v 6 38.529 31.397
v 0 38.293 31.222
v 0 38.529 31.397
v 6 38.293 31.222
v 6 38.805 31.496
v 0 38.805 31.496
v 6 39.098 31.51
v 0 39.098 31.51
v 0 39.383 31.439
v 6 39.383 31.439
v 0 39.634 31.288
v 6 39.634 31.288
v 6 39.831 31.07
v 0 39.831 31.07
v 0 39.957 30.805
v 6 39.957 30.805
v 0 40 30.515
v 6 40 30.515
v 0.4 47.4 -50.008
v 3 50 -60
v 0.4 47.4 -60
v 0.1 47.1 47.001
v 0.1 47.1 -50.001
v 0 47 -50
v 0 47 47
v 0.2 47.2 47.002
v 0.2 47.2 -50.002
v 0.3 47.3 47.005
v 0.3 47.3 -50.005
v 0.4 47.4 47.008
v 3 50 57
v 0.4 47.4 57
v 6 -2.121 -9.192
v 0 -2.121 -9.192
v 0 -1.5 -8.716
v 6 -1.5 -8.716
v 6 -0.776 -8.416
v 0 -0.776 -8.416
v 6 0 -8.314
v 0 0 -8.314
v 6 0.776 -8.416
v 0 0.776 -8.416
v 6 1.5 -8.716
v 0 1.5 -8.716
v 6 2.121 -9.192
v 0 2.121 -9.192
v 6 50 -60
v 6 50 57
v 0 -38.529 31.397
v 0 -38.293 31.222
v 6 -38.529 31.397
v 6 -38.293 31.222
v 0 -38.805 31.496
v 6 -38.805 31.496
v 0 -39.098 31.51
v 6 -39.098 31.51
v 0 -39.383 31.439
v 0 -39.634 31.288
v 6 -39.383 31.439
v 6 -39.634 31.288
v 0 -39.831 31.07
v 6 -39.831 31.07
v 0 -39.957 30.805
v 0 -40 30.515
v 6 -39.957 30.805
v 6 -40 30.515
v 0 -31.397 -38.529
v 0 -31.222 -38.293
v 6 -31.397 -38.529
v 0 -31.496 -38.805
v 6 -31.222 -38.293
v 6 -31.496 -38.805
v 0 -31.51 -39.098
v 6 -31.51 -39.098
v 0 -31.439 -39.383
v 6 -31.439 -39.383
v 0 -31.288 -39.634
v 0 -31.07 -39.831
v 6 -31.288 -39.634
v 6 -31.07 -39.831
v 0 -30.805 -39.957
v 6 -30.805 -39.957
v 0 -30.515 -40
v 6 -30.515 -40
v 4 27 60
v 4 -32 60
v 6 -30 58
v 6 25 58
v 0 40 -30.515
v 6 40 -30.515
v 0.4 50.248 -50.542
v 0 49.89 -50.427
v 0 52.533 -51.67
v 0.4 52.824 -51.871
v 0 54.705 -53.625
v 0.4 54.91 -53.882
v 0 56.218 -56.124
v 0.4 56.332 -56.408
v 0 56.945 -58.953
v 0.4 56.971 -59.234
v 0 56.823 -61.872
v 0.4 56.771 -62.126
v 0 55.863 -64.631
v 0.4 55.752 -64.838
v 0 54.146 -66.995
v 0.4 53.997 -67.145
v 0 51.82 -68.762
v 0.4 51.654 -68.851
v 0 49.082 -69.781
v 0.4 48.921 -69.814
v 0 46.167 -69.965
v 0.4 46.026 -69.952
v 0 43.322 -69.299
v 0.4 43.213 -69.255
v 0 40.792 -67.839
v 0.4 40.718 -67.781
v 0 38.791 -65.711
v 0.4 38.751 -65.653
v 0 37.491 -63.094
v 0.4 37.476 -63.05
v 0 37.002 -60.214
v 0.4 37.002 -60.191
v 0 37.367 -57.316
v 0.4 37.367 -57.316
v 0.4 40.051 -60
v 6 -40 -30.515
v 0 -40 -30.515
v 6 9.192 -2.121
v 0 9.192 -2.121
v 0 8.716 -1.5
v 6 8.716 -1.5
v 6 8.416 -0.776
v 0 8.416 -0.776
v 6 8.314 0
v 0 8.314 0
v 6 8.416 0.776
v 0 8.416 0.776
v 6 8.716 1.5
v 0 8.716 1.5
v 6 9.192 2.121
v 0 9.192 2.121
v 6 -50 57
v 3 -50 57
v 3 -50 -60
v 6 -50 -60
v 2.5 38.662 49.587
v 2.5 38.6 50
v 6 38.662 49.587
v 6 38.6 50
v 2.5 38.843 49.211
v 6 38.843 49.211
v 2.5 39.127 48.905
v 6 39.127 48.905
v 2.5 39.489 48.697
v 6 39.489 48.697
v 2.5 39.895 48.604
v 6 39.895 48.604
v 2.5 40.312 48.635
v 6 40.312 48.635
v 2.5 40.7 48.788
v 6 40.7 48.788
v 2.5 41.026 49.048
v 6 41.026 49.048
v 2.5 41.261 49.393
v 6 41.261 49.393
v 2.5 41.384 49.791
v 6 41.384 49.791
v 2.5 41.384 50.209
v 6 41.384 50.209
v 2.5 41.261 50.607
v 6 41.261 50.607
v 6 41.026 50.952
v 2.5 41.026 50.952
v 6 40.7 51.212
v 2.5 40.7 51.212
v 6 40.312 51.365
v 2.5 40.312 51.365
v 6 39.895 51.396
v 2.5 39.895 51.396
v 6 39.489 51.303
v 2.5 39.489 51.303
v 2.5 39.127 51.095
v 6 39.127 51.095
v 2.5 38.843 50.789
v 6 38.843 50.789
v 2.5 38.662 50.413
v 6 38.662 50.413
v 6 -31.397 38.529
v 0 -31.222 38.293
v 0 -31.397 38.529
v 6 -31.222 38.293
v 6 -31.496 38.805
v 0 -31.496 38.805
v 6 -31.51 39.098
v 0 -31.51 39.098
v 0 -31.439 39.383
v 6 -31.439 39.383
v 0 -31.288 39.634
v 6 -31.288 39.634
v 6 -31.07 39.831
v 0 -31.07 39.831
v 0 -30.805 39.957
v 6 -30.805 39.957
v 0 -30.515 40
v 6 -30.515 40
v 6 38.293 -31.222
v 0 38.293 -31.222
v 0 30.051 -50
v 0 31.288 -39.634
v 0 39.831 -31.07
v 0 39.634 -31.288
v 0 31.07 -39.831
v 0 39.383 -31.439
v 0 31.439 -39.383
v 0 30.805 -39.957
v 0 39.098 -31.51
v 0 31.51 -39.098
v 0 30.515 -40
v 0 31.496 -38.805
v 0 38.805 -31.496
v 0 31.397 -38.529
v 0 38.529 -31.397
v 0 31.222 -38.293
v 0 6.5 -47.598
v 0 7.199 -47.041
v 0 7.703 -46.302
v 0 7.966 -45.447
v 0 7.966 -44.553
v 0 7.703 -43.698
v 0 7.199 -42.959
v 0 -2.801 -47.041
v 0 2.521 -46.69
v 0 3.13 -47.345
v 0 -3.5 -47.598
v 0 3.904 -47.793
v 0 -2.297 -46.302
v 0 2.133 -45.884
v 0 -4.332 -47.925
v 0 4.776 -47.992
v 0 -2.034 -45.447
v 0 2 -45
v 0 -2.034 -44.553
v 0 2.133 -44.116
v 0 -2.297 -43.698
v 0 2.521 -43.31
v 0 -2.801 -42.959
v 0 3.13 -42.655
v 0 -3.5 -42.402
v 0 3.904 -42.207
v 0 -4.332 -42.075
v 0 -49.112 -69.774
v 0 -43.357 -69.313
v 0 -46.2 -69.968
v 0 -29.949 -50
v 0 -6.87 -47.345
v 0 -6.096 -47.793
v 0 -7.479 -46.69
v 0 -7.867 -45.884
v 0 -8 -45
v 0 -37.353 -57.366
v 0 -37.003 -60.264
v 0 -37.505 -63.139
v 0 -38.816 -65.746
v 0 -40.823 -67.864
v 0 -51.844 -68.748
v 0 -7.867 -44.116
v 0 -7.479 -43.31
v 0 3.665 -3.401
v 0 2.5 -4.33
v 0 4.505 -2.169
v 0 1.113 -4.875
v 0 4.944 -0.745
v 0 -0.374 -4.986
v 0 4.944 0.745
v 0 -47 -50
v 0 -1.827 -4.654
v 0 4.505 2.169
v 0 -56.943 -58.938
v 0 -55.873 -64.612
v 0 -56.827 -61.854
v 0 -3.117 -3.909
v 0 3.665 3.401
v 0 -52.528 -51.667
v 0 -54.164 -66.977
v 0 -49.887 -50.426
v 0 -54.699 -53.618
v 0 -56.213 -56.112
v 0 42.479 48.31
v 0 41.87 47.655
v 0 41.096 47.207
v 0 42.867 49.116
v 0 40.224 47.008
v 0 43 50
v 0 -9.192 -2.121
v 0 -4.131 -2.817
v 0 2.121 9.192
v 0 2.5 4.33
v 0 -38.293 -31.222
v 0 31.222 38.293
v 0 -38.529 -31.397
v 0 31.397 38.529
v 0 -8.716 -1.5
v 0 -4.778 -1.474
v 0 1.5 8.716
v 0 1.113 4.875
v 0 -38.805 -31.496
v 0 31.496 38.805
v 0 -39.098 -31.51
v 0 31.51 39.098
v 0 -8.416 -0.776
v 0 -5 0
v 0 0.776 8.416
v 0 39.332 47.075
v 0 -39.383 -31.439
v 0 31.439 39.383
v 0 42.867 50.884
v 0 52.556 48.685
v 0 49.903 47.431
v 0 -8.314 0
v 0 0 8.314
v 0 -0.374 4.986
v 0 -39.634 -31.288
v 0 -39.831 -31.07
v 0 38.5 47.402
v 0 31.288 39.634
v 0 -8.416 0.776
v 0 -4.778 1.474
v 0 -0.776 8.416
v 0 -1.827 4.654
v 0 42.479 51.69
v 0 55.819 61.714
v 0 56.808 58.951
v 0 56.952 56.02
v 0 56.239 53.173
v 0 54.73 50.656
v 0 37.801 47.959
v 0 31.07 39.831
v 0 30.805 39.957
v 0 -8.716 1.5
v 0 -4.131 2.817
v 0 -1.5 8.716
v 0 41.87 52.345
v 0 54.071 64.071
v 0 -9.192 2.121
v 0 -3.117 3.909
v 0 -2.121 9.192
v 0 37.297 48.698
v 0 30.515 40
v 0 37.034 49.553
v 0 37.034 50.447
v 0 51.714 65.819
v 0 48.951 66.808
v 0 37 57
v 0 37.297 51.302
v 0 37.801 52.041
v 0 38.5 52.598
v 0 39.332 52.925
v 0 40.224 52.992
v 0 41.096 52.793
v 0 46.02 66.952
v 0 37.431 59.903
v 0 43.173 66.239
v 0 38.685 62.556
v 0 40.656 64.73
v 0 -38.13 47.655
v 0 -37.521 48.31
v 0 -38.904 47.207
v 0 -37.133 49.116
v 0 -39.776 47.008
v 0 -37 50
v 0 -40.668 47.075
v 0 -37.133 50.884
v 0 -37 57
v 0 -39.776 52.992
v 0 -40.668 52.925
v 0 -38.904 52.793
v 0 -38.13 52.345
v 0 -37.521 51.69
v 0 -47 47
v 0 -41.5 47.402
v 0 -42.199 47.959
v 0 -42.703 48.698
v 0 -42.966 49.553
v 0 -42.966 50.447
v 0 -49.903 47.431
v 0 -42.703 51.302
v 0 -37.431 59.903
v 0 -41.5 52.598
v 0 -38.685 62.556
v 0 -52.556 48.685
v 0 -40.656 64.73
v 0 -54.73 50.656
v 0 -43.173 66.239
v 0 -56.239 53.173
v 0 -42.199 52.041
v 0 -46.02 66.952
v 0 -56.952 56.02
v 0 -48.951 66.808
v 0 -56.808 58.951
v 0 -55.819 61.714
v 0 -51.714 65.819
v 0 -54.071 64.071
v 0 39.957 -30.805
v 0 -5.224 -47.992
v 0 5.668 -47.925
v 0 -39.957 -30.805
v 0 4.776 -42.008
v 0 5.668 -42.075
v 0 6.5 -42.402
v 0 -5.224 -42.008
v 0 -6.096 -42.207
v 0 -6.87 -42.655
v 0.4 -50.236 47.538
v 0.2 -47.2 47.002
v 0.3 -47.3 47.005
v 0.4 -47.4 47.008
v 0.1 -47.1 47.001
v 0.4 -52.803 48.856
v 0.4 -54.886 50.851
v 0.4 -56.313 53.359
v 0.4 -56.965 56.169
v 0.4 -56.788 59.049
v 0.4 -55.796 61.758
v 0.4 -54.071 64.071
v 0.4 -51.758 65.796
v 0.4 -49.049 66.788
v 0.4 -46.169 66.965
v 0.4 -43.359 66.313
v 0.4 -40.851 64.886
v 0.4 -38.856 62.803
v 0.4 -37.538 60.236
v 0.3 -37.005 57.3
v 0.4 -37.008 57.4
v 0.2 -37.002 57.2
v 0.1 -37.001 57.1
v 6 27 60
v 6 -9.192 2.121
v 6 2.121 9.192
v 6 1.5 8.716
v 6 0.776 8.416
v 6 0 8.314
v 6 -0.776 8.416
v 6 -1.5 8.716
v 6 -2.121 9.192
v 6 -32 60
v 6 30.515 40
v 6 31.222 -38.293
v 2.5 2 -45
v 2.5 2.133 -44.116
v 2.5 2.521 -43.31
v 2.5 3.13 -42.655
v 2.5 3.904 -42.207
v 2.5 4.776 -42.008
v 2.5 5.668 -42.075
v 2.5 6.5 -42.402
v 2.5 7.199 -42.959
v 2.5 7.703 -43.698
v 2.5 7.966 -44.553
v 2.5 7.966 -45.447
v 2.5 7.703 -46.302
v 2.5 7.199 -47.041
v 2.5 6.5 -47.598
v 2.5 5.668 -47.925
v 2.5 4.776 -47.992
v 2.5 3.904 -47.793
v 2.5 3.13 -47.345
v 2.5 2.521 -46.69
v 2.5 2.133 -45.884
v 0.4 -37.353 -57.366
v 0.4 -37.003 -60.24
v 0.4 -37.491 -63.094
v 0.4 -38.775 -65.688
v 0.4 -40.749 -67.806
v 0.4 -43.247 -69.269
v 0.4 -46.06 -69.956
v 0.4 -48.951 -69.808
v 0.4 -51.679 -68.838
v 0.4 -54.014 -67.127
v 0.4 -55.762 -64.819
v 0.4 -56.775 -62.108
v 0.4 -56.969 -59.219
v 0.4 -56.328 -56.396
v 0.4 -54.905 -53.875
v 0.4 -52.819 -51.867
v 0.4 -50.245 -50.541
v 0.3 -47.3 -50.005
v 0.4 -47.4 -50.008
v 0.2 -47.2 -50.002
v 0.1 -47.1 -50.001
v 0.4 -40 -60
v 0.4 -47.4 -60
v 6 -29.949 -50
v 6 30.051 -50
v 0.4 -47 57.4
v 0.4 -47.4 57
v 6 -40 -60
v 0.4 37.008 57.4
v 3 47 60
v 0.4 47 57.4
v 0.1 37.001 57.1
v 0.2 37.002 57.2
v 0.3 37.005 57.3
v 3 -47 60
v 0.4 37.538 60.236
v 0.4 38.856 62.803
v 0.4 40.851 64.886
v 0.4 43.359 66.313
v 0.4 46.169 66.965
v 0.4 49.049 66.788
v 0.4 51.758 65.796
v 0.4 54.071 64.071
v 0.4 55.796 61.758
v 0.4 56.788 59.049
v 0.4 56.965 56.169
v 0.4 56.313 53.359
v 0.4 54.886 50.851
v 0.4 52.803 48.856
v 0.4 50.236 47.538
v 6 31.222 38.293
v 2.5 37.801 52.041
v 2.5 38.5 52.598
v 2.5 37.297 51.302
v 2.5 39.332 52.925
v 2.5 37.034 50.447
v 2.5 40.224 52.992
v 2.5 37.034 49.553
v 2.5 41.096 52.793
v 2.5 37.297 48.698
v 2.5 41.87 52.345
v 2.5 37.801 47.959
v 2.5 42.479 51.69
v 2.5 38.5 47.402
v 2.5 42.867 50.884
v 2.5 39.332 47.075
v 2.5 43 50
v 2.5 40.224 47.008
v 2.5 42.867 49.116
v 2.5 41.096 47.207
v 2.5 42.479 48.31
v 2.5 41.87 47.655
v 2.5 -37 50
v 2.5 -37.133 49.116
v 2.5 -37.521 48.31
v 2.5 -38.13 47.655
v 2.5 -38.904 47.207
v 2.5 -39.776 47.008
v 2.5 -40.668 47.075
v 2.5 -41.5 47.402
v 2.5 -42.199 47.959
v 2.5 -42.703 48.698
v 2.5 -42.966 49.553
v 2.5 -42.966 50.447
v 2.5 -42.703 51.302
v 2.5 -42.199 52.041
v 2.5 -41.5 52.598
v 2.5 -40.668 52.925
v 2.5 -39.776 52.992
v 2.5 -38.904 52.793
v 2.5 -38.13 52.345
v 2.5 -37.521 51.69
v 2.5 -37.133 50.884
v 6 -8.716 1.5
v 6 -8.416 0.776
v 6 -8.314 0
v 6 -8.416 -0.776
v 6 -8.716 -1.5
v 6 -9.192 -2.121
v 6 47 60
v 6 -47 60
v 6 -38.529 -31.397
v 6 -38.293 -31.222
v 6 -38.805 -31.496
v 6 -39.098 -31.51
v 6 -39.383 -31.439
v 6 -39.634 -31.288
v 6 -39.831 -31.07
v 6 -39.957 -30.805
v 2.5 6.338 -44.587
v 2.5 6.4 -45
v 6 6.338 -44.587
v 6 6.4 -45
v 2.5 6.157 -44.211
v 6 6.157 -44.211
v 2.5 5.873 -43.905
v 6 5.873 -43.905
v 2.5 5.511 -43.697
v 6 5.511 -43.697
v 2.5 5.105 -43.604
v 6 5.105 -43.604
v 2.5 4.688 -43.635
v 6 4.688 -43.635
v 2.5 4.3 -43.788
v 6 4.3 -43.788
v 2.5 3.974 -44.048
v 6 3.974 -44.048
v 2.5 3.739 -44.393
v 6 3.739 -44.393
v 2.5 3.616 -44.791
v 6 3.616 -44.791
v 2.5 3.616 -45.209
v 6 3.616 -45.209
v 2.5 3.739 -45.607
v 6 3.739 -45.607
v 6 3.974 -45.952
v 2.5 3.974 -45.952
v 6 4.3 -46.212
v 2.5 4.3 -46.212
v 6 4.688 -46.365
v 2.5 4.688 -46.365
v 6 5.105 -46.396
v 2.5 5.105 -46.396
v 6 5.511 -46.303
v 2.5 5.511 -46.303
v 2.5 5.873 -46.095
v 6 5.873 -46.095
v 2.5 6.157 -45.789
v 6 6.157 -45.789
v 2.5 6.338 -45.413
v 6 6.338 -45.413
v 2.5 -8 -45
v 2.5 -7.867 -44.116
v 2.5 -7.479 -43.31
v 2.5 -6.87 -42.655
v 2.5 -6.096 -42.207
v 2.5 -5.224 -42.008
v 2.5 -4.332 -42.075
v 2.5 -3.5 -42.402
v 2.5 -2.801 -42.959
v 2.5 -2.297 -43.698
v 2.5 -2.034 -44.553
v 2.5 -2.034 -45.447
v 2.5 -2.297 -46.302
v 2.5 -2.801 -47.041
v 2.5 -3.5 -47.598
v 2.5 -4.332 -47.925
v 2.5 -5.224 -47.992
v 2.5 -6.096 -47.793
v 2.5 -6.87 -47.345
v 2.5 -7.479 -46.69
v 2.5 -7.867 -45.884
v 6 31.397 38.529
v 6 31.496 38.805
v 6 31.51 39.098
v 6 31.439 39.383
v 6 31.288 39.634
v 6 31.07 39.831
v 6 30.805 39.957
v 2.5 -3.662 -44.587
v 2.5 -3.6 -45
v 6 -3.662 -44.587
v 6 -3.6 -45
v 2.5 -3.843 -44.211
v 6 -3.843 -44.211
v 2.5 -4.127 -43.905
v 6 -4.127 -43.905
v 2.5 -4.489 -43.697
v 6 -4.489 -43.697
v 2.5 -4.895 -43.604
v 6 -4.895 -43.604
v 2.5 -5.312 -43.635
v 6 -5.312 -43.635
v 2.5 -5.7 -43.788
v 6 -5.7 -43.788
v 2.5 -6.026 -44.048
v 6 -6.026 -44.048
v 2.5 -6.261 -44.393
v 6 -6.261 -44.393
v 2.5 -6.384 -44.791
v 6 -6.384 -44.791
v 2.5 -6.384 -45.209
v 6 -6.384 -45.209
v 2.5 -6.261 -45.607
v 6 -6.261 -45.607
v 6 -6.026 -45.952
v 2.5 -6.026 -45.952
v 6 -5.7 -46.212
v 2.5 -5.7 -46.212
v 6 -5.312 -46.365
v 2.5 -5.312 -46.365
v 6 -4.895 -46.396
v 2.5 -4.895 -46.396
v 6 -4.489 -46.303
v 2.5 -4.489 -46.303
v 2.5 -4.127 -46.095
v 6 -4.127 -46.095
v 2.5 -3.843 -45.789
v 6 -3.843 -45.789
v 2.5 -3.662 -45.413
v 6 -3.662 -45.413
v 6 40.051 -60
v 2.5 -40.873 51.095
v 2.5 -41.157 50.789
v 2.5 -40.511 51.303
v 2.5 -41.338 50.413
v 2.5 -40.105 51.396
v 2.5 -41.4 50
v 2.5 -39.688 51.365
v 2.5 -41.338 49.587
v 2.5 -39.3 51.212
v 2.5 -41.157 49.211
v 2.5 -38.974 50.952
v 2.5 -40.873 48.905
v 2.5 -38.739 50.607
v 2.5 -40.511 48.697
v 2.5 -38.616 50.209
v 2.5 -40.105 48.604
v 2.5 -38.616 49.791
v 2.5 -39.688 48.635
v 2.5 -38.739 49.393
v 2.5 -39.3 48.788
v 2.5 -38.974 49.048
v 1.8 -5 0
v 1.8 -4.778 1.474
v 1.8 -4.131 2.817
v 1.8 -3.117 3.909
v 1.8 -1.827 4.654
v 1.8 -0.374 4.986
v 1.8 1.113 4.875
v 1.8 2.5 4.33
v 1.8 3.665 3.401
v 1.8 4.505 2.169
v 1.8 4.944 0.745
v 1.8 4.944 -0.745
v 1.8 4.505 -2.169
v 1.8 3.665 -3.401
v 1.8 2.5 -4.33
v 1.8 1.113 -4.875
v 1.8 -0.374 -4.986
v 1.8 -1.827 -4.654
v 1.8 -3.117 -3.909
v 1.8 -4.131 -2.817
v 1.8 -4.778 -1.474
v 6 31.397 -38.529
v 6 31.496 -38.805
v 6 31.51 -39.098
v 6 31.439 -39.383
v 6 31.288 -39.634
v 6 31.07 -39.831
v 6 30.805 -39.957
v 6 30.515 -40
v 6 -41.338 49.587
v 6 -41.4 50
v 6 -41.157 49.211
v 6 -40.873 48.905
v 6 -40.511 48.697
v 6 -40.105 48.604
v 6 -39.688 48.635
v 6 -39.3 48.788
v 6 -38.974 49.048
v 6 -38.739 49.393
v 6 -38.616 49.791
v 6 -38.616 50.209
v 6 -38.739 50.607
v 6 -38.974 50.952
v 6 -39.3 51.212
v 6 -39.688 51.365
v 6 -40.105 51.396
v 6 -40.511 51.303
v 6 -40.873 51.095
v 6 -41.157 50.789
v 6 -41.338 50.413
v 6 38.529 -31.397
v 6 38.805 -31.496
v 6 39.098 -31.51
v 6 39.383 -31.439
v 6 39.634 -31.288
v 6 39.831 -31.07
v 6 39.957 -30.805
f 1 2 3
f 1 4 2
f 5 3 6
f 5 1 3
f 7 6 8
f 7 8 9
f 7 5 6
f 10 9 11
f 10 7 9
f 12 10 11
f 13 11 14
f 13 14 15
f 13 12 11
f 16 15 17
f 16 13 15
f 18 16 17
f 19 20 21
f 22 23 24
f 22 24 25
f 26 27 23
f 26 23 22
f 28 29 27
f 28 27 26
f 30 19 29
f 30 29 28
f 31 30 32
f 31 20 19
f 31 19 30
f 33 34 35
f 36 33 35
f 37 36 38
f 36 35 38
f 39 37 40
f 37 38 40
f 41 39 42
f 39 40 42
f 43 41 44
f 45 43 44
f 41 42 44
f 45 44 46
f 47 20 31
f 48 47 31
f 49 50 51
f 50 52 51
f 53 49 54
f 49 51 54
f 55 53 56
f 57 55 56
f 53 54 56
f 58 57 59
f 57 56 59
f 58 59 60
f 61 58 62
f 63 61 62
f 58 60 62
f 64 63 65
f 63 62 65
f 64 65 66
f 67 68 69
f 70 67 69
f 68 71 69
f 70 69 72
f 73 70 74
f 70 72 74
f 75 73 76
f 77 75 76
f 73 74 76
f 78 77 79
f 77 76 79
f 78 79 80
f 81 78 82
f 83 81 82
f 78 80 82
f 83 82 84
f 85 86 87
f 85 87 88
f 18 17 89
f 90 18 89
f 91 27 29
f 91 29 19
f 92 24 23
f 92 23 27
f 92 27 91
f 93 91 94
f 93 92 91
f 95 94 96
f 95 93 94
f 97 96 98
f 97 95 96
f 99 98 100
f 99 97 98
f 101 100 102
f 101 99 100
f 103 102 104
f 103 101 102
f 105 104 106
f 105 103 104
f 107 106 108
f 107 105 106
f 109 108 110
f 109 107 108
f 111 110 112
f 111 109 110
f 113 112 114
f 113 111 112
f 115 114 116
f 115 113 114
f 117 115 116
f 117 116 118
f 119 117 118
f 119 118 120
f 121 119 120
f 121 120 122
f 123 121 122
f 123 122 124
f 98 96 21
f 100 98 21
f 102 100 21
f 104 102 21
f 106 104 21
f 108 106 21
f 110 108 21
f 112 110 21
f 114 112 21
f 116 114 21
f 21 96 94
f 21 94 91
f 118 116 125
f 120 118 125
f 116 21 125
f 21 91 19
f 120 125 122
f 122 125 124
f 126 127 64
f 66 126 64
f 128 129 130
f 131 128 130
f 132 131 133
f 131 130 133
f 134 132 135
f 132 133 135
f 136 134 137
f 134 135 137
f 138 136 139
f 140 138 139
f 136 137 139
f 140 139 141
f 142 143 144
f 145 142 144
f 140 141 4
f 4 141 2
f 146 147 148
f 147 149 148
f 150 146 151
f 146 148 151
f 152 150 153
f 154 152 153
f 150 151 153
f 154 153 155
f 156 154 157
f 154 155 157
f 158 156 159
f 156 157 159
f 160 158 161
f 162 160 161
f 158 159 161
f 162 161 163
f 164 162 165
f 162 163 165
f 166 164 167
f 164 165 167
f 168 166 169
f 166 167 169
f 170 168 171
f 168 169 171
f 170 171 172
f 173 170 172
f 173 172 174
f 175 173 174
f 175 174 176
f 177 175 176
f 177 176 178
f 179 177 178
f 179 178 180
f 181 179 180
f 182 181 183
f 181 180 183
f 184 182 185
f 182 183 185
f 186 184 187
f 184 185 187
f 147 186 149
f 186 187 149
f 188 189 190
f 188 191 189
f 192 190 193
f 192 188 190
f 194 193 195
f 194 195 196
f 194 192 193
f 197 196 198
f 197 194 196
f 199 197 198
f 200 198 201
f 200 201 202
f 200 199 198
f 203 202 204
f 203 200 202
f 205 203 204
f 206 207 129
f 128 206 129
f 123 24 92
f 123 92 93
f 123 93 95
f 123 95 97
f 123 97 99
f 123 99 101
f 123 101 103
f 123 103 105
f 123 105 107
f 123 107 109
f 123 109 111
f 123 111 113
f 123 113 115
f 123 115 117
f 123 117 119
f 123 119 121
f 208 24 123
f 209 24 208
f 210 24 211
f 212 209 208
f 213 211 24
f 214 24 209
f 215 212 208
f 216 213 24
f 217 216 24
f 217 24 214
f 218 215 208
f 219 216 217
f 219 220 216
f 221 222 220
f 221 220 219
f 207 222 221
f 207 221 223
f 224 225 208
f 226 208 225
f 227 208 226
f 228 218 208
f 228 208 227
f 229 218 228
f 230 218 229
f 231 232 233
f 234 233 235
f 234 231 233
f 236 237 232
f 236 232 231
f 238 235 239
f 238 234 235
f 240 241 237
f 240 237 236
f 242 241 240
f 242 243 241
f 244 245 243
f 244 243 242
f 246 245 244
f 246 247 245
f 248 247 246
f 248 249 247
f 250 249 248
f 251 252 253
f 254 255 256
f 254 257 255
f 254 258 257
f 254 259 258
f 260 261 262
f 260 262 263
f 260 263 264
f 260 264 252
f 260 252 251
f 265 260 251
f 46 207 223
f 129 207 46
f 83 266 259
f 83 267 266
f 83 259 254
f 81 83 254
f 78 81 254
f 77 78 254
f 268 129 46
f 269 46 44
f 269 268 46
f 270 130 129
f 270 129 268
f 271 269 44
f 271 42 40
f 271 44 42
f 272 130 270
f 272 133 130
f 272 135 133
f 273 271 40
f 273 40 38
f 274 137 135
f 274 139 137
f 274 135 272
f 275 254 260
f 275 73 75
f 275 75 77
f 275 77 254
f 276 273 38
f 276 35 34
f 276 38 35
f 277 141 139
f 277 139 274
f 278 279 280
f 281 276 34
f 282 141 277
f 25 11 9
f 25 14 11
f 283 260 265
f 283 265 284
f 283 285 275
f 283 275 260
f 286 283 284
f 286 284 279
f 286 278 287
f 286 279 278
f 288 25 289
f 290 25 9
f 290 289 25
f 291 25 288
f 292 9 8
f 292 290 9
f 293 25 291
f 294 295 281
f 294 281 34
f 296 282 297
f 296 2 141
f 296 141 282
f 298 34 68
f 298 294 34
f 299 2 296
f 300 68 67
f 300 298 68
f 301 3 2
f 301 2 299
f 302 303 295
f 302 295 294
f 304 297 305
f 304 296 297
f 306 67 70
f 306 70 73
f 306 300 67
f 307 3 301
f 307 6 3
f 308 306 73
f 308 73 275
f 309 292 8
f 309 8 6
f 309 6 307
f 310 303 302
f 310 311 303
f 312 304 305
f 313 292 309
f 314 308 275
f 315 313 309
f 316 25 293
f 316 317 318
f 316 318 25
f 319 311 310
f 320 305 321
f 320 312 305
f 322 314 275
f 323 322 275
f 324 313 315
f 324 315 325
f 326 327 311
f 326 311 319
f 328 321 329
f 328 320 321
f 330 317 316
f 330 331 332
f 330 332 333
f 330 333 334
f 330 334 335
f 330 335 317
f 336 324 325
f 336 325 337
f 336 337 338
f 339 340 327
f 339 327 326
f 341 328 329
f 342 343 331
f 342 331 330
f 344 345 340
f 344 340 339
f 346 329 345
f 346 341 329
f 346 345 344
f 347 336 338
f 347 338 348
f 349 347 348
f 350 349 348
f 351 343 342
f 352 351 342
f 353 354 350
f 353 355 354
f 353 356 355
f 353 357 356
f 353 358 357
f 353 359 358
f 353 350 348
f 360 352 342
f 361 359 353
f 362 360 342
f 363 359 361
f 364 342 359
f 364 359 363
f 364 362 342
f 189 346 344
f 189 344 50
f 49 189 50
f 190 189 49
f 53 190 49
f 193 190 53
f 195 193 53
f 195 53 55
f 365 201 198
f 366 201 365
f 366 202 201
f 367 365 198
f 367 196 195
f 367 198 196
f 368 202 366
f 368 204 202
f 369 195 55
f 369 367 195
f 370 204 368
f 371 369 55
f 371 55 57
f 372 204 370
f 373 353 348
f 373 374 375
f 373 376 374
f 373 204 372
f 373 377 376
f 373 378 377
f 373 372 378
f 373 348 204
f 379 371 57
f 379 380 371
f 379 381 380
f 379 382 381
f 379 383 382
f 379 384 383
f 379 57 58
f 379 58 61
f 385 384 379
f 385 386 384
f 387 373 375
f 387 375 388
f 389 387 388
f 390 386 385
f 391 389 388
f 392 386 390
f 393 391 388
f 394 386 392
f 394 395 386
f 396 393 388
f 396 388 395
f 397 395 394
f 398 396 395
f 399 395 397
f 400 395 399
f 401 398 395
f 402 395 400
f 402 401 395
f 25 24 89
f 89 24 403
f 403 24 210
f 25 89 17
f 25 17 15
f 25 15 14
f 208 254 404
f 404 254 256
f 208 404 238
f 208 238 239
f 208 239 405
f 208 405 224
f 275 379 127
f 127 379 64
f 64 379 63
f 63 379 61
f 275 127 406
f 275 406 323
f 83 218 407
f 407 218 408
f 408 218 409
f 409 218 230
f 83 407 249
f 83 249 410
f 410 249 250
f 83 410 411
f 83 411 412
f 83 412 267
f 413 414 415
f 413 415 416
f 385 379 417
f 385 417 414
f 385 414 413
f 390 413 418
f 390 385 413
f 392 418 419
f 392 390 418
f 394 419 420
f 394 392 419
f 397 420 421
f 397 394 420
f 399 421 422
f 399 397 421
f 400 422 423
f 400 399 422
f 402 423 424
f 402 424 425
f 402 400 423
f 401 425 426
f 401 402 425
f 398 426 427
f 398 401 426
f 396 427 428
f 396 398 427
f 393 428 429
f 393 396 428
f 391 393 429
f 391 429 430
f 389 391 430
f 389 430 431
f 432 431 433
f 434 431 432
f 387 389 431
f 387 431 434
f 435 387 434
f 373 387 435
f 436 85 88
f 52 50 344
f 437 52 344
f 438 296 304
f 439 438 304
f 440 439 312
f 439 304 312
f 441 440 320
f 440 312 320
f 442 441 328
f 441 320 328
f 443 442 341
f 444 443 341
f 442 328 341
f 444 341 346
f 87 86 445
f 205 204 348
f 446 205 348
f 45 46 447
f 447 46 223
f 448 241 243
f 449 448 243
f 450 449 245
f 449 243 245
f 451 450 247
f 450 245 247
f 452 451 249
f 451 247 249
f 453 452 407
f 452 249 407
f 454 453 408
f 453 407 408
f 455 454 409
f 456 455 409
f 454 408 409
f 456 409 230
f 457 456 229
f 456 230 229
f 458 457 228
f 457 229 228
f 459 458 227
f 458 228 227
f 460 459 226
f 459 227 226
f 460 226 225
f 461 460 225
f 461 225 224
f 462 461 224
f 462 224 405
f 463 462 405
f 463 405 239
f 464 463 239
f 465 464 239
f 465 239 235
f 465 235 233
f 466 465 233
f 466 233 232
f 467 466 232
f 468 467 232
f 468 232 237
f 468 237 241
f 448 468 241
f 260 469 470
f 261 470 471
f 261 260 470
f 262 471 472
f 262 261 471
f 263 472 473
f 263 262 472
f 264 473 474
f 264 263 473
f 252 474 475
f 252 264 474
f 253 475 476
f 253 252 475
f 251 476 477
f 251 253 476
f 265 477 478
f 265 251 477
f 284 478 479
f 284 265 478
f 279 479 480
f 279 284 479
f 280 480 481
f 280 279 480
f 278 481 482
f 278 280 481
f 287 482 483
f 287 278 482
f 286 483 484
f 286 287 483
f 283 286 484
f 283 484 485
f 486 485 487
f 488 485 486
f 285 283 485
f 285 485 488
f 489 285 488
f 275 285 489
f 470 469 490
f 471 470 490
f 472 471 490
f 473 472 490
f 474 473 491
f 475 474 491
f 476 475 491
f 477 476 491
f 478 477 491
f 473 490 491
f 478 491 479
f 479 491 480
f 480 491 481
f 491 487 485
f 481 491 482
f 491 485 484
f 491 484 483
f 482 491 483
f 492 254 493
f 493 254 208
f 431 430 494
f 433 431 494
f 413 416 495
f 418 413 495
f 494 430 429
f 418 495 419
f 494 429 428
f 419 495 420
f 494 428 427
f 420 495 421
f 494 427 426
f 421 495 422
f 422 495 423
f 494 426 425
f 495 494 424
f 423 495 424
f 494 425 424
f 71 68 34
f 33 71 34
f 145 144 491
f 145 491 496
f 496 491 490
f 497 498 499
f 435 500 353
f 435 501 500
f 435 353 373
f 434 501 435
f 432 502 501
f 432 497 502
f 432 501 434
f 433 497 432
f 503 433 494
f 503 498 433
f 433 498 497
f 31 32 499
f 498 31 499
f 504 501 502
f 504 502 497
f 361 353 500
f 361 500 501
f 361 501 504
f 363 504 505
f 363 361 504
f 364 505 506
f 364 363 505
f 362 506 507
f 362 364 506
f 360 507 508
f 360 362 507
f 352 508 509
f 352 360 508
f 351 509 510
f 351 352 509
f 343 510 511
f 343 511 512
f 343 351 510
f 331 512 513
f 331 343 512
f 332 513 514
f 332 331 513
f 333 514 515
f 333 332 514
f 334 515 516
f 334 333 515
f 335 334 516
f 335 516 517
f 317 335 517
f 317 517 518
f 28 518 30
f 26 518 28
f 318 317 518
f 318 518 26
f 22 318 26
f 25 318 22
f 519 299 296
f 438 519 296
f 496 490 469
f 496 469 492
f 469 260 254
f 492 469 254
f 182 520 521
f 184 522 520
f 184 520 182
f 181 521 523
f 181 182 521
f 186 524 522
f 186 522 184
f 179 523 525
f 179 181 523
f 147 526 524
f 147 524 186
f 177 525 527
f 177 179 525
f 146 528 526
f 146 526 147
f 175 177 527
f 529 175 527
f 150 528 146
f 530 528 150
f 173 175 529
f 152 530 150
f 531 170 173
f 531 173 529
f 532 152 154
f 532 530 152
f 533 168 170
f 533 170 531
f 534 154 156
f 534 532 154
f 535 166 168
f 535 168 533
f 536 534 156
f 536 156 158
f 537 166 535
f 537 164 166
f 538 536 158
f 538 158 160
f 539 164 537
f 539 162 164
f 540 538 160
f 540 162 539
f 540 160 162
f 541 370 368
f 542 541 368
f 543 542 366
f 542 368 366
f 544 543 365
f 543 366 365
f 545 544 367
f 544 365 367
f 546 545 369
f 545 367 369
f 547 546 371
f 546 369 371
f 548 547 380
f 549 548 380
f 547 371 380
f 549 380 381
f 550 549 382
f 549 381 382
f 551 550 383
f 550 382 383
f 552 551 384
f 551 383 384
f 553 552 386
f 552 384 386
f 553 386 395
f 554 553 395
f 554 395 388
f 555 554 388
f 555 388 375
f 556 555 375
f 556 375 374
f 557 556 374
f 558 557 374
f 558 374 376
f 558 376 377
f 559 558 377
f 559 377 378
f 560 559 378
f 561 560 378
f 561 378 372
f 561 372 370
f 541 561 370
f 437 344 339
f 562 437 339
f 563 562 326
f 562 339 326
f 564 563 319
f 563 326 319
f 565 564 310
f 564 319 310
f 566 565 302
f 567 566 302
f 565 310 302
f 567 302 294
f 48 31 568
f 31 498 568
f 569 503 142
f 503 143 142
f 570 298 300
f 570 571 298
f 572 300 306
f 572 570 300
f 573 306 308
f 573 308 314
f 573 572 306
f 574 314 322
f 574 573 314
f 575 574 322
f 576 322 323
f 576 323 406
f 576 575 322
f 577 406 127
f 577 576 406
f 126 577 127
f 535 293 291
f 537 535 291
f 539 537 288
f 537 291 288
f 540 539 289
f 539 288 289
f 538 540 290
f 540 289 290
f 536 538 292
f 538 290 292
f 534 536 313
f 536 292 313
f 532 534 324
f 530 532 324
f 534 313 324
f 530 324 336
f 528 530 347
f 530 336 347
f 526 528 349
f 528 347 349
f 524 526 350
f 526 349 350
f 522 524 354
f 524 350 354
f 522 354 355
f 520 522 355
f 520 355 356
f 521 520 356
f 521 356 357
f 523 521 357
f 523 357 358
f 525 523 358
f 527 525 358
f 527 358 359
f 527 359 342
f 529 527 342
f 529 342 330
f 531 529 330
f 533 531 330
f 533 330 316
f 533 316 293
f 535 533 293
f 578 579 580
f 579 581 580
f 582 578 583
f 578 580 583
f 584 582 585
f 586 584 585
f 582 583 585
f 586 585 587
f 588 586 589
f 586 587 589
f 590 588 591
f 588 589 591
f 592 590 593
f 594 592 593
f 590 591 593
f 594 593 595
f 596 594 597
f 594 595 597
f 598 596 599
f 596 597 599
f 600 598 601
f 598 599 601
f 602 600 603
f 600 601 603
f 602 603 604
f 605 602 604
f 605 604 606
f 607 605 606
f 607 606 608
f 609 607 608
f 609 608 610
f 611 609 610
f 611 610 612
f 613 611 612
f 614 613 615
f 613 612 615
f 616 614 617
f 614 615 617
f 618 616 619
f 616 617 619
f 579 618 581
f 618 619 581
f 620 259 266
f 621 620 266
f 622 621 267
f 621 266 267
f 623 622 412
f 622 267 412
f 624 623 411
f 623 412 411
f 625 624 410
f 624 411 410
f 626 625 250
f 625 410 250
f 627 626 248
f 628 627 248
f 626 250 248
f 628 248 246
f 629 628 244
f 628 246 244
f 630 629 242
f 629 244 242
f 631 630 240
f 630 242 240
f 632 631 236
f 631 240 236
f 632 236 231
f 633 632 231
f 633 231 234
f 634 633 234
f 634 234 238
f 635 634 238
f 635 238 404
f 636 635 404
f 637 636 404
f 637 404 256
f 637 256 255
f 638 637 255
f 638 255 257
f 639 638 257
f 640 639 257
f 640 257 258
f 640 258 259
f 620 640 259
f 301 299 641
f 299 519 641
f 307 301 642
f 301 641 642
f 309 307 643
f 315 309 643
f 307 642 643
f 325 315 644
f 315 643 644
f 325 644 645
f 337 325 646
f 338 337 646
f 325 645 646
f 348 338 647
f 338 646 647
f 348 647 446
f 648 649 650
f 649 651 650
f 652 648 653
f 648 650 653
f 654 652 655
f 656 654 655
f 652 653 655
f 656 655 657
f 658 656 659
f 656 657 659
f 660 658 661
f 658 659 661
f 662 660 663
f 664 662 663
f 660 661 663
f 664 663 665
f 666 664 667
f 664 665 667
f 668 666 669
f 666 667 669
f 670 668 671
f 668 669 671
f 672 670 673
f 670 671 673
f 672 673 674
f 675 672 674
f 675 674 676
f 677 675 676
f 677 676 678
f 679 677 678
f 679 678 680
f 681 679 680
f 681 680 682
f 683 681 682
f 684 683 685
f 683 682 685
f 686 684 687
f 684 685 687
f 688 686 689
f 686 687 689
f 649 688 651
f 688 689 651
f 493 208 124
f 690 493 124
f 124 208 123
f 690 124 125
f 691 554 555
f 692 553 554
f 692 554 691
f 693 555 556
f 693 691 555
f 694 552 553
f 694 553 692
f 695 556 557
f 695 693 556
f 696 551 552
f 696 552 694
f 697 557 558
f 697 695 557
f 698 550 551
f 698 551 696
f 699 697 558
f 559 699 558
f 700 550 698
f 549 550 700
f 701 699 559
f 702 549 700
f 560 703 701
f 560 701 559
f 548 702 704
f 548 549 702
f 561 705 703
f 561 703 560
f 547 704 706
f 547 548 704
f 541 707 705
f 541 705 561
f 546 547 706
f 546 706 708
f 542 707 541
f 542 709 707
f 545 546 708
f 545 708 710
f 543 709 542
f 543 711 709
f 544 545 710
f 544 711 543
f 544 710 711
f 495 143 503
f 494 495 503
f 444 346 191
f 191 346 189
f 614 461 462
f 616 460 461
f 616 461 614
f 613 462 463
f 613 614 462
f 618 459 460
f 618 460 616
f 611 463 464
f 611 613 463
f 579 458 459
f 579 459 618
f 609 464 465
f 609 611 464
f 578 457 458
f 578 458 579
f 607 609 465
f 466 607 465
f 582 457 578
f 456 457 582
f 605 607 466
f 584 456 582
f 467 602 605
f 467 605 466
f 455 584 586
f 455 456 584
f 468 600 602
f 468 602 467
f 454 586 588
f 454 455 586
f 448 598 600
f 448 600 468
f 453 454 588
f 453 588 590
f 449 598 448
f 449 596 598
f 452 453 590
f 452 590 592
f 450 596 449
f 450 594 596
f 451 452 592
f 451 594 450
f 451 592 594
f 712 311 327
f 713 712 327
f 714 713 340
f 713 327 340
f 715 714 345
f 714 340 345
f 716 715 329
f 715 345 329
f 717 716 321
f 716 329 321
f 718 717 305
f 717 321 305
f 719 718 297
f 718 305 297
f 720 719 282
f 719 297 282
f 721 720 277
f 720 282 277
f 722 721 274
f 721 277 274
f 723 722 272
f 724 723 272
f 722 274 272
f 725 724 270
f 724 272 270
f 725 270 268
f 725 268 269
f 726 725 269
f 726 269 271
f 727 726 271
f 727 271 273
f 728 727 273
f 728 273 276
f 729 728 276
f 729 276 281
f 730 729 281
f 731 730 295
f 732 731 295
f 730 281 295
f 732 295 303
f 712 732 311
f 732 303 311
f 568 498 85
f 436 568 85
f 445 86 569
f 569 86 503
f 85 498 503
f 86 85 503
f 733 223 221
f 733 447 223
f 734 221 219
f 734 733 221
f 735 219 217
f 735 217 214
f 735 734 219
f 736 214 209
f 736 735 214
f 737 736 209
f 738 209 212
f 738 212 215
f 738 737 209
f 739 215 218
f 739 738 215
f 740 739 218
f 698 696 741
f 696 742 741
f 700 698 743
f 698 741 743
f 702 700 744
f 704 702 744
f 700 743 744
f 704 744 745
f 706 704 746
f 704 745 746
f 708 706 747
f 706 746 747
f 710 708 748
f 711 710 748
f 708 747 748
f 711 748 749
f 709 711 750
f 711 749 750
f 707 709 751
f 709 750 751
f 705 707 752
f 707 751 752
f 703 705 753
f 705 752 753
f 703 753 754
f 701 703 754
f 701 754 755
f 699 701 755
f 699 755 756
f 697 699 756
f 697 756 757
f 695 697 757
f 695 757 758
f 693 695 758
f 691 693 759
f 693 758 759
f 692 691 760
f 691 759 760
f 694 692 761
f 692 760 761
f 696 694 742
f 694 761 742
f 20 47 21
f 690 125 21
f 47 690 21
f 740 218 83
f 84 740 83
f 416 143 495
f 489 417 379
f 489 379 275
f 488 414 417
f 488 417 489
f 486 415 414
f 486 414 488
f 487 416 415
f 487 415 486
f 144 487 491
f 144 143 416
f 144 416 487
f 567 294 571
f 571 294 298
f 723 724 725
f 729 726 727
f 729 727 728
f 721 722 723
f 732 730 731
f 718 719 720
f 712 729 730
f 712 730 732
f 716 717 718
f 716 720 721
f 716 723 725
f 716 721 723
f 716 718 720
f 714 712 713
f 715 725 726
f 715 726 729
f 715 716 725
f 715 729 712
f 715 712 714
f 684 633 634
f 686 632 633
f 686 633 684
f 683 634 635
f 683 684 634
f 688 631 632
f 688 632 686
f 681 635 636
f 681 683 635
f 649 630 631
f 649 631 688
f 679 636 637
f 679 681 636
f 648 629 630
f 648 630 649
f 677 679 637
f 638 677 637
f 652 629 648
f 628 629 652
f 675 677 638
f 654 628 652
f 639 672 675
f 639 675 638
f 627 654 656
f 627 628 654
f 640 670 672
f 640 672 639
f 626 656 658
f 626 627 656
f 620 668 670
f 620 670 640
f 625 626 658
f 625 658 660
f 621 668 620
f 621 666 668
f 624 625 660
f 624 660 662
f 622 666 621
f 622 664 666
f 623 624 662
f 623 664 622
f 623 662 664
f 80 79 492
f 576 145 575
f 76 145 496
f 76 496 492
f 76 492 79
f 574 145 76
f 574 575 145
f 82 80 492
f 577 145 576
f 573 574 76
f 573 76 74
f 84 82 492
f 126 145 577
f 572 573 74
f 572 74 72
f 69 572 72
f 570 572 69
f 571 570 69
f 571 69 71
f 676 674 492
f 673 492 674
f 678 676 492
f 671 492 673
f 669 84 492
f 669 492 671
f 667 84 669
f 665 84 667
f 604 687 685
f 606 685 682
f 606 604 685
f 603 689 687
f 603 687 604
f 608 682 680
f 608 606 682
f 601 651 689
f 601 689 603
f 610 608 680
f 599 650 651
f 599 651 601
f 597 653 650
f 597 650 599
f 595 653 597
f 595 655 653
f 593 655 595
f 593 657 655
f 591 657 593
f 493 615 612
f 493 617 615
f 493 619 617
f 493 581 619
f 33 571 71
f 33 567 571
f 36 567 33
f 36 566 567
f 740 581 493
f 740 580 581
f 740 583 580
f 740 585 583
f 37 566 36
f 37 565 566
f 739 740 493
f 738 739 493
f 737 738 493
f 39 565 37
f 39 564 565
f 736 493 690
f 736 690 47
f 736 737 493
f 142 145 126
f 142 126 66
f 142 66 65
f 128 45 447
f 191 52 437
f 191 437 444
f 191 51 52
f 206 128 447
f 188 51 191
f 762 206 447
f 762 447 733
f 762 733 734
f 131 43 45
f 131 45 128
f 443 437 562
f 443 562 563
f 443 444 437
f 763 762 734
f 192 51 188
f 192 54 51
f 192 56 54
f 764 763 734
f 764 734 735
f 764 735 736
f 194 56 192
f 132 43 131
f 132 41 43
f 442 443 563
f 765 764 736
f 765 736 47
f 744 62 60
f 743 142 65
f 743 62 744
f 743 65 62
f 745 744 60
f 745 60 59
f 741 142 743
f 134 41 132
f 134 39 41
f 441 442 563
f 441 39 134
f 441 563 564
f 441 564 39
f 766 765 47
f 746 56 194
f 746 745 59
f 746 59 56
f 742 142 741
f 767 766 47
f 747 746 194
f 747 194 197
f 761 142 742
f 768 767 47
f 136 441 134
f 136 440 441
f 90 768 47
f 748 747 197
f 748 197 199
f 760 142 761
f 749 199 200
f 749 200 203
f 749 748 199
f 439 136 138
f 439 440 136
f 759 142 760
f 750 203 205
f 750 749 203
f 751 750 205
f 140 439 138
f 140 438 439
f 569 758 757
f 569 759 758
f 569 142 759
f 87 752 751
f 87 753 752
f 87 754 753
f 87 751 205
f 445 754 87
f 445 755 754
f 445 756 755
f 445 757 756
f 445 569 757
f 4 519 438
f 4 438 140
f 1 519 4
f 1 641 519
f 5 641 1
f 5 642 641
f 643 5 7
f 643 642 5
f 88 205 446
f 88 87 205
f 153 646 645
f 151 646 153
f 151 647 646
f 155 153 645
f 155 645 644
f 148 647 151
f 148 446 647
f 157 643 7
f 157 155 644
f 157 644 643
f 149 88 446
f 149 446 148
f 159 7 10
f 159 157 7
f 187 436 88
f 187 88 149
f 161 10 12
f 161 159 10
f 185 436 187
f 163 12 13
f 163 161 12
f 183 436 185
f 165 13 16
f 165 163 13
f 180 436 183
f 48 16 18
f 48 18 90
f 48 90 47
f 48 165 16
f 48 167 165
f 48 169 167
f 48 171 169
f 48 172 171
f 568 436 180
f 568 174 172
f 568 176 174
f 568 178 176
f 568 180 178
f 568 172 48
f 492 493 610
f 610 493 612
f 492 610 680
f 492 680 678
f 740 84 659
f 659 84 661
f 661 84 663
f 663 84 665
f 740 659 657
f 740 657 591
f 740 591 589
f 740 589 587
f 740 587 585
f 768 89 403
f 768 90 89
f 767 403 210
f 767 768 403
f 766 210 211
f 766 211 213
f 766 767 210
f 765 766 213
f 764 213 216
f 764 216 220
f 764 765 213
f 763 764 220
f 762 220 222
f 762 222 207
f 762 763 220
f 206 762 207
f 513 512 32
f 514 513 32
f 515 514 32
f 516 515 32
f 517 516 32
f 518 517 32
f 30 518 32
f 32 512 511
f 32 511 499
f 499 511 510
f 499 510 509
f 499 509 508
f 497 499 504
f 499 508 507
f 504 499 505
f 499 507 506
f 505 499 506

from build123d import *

# Parameters (mm, degrees)
F1_DEPTH       = 6
F2_R           = 1
F3_D           = 2.8
F3_CBORE_D     = 6
F3_CBORE_DEPTH = 2.5
F4_R           = 5
F5_DEPTH       = 1.8
F7_D           = 2.8
F7_CBORE_D     = 6
F7_CBORE_DEPTH = 2.5
F8_SIZE        = 3
F10_DEPTH      = 0.4
F11_W          = 2
F11_H          = 59
F12_DEPTH      = 2
F13_SIZE       = 1.99999


# Not quite as in the source:
# - a fillet or chamfer is up to 0.001 mm smaller than in the source, because OpenCascade refuses the exact size


with BuildPart() as f1:
    # F0 (on Right) → F1 (new body)
    with BuildSketch(Plane.YZ):
        Polygon((40.0512183458, -60), (50, -60), (50, 60), (-50, 60), (-50, -60), (-40, -60), (-29.9487816542, -50), (30.0512183458, -50), align=None)
        with BuildLine():
            Line((2.1213203436, -9.1923881554), (32.9289321881, -40))
            Line((32.9289321881, -40), (-32.9289321881, -40))
            Line((-32.9289321881, -40), (-2.1213203436, -9.1923881554))
            ThreePointArc((-2.1213203436, -9.1923881554), (0, -8.313708499), (2.1213203436, -9.1923881554))
        make_face(mode=Mode.SUBTRACT)
        with BuildLine():
            Line((-9.1923881554, -2.1213203436), (-40, -32.9289321881))
            Line((-40, -32.9289321881), (-40, 32.9289321881))
            Line((-40, 32.9289321881), (-9.1923881554, 2.1213203436))
            ThreePointArc((-9.1923881554, 2.1213203436), (-8.313708499, 0), (-9.1923881554, -2.1213203436))
        make_face(mode=Mode.SUBTRACT)
        with BuildLine():
            Line((40, 32.9289321881), (40, -32.9289321881))
            Line((40, -32.9289321881), (9.1923881554, -2.1213203436))
            ThreePointArc((9.1923881554, -2.1213203436), (8.313708499, 0), (9.1923881554, 2.1213203436))
            Line((9.1923881554, 2.1213203436), (40, 32.9289321881))
        make_face(mode=Mode.SUBTRACT)
        with BuildLine():
            Line((-32.9289321881, 40), (32.9289321881, 40))
            Line((32.9289321881, 40), (2.1213203436, 9.1923881554))
            ThreePointArc((2.1213203436, 9.1923881554), (0, 8.313708499), (-2.1213203436, 9.1923881554))
            Line((-2.1213203436, 9.1923881554), (-32.9289321881, 40))
        make_face(mode=Mode.SUBTRACT)
    extrude(amount=F1_DEPTH)

    # F2
    f2_edges = [f1.edges().sort_by_distance(p)[0] for p in [
        (3, -32.928932, 40),
        (3, 32.928932, 40),
        (3, -40, 32.928932),
        (3, -40, -32.928932),
        (3, -32.928932, -40),
        (3, 40, 32.928932),
        (3, 40, -32.928932),
        (3, 32.928932, -40),
    ]]
    fillet(f2_edges, radius=F2_R)

    # F3 (through all)
    with Locations(Plane(origin=(0, 0, 0), x_dir=(0, 1, 0), z_dir=(-1, 0, 0))):
        with Locations((-40, -50), (40, -50)):
            CounterBoreHole(F3_D / 2, F3_CBORE_D / 2, F3_CBORE_DEPTH)

    # F4 (on face) → F5 (cut)
    with BuildSketch(Plane(origin=(0, 0, 0), x_dir=(0, -1, 0), z_dir=(-1, 0, 0))):
        Circle(F4_R)
    extrude(amount=-F5_DEPTH, mode=Mode.SUBTRACT)

    # F7 (through all)
    with Locations(Plane(origin=(0, 0, 0), x_dir=(0, -1, 0), z_dir=(-1, 0, 0))):
        with Locations((-5, -45), (5, -45)):
            CounterBoreHole(F7_D / 2, F7_CBORE_D / 2, F7_CBORE_DEPTH)

    # F8
    f8_edges = [f1.edges().sort_by_distance(p)[0] for p in [
        (3, -50, 60),
        (3, 50, 60),
        (0, -50, 0),
        (0, 50, 0),
        (0, 0, 60),
    ]]
    chamfer(f8_edges, length=F8_SIZE)

    # F9 (on face) → F10 (join)
    with BuildSketch(Plane(origin=(0, 0, 0), x_dir=(0, -1, 0), z_dir=(-1, 0, 0))):
        with BuildLine():
            Line((-47, 57), (-37, 57))
            ThreePointArc((-37, 57), (-54.0710678119, 64.0710678119), (-47, 47))
            Line((-47, 47), (-47, 57))
        make_face()
        with BuildLine():
            ThreePointArc((47, 47), (54.0710678119, 64.0710678119), (37, 57))
            Line((37, 57), (47, 57))
            Line((47, 57), (47, 47))
        make_face()
        with BuildLine():
            Line((-47, -60), (-47, -50))
            ThreePointArc((-47, -50), (-53.0480452096, -67.9637396456), (-37.3669885172, -57.3157701715))
            Line((-37.3669885172, -57.3157701715), (-40.0512183458, -60))
            Line((-40.0512183458, -60), (-47, -60))
        make_face()
        with BuildLine():
            ThreePointArc((37.3529996858, -57.3664880981), (53.0689735945, -67.9478021811), (47, -50))
            Line((47, -50), (47, -60))
            Line((47, -60), (40, -60))
            Line((40, -60), (37.3529996858, -57.3664880981))
        make_face()
    extrude(amount=-F10_DEPTH)

    # F11 (on face) → F12 (cut)
    with BuildSketch(Plane.XY.offset(60)):
        with Locations((5, -2.5)):
            Rectangle(F11_W, F11_H)
    extrude(amount=-F12_DEPTH, mode=Mode.SUBTRACT)

    # F13 (size 2 in the source; OpenCascade refuses exactly that, so slightly less here)
    f13_edges = [f1.edges().sort_by_distance(p)[0] for p in [
        (4, -2.5, 58),
        (5, 27, 58),
        (5, -32, 58),
    ]]
    chamfer(f13_edges, length=F13_SIZE)


solid = f1.part
